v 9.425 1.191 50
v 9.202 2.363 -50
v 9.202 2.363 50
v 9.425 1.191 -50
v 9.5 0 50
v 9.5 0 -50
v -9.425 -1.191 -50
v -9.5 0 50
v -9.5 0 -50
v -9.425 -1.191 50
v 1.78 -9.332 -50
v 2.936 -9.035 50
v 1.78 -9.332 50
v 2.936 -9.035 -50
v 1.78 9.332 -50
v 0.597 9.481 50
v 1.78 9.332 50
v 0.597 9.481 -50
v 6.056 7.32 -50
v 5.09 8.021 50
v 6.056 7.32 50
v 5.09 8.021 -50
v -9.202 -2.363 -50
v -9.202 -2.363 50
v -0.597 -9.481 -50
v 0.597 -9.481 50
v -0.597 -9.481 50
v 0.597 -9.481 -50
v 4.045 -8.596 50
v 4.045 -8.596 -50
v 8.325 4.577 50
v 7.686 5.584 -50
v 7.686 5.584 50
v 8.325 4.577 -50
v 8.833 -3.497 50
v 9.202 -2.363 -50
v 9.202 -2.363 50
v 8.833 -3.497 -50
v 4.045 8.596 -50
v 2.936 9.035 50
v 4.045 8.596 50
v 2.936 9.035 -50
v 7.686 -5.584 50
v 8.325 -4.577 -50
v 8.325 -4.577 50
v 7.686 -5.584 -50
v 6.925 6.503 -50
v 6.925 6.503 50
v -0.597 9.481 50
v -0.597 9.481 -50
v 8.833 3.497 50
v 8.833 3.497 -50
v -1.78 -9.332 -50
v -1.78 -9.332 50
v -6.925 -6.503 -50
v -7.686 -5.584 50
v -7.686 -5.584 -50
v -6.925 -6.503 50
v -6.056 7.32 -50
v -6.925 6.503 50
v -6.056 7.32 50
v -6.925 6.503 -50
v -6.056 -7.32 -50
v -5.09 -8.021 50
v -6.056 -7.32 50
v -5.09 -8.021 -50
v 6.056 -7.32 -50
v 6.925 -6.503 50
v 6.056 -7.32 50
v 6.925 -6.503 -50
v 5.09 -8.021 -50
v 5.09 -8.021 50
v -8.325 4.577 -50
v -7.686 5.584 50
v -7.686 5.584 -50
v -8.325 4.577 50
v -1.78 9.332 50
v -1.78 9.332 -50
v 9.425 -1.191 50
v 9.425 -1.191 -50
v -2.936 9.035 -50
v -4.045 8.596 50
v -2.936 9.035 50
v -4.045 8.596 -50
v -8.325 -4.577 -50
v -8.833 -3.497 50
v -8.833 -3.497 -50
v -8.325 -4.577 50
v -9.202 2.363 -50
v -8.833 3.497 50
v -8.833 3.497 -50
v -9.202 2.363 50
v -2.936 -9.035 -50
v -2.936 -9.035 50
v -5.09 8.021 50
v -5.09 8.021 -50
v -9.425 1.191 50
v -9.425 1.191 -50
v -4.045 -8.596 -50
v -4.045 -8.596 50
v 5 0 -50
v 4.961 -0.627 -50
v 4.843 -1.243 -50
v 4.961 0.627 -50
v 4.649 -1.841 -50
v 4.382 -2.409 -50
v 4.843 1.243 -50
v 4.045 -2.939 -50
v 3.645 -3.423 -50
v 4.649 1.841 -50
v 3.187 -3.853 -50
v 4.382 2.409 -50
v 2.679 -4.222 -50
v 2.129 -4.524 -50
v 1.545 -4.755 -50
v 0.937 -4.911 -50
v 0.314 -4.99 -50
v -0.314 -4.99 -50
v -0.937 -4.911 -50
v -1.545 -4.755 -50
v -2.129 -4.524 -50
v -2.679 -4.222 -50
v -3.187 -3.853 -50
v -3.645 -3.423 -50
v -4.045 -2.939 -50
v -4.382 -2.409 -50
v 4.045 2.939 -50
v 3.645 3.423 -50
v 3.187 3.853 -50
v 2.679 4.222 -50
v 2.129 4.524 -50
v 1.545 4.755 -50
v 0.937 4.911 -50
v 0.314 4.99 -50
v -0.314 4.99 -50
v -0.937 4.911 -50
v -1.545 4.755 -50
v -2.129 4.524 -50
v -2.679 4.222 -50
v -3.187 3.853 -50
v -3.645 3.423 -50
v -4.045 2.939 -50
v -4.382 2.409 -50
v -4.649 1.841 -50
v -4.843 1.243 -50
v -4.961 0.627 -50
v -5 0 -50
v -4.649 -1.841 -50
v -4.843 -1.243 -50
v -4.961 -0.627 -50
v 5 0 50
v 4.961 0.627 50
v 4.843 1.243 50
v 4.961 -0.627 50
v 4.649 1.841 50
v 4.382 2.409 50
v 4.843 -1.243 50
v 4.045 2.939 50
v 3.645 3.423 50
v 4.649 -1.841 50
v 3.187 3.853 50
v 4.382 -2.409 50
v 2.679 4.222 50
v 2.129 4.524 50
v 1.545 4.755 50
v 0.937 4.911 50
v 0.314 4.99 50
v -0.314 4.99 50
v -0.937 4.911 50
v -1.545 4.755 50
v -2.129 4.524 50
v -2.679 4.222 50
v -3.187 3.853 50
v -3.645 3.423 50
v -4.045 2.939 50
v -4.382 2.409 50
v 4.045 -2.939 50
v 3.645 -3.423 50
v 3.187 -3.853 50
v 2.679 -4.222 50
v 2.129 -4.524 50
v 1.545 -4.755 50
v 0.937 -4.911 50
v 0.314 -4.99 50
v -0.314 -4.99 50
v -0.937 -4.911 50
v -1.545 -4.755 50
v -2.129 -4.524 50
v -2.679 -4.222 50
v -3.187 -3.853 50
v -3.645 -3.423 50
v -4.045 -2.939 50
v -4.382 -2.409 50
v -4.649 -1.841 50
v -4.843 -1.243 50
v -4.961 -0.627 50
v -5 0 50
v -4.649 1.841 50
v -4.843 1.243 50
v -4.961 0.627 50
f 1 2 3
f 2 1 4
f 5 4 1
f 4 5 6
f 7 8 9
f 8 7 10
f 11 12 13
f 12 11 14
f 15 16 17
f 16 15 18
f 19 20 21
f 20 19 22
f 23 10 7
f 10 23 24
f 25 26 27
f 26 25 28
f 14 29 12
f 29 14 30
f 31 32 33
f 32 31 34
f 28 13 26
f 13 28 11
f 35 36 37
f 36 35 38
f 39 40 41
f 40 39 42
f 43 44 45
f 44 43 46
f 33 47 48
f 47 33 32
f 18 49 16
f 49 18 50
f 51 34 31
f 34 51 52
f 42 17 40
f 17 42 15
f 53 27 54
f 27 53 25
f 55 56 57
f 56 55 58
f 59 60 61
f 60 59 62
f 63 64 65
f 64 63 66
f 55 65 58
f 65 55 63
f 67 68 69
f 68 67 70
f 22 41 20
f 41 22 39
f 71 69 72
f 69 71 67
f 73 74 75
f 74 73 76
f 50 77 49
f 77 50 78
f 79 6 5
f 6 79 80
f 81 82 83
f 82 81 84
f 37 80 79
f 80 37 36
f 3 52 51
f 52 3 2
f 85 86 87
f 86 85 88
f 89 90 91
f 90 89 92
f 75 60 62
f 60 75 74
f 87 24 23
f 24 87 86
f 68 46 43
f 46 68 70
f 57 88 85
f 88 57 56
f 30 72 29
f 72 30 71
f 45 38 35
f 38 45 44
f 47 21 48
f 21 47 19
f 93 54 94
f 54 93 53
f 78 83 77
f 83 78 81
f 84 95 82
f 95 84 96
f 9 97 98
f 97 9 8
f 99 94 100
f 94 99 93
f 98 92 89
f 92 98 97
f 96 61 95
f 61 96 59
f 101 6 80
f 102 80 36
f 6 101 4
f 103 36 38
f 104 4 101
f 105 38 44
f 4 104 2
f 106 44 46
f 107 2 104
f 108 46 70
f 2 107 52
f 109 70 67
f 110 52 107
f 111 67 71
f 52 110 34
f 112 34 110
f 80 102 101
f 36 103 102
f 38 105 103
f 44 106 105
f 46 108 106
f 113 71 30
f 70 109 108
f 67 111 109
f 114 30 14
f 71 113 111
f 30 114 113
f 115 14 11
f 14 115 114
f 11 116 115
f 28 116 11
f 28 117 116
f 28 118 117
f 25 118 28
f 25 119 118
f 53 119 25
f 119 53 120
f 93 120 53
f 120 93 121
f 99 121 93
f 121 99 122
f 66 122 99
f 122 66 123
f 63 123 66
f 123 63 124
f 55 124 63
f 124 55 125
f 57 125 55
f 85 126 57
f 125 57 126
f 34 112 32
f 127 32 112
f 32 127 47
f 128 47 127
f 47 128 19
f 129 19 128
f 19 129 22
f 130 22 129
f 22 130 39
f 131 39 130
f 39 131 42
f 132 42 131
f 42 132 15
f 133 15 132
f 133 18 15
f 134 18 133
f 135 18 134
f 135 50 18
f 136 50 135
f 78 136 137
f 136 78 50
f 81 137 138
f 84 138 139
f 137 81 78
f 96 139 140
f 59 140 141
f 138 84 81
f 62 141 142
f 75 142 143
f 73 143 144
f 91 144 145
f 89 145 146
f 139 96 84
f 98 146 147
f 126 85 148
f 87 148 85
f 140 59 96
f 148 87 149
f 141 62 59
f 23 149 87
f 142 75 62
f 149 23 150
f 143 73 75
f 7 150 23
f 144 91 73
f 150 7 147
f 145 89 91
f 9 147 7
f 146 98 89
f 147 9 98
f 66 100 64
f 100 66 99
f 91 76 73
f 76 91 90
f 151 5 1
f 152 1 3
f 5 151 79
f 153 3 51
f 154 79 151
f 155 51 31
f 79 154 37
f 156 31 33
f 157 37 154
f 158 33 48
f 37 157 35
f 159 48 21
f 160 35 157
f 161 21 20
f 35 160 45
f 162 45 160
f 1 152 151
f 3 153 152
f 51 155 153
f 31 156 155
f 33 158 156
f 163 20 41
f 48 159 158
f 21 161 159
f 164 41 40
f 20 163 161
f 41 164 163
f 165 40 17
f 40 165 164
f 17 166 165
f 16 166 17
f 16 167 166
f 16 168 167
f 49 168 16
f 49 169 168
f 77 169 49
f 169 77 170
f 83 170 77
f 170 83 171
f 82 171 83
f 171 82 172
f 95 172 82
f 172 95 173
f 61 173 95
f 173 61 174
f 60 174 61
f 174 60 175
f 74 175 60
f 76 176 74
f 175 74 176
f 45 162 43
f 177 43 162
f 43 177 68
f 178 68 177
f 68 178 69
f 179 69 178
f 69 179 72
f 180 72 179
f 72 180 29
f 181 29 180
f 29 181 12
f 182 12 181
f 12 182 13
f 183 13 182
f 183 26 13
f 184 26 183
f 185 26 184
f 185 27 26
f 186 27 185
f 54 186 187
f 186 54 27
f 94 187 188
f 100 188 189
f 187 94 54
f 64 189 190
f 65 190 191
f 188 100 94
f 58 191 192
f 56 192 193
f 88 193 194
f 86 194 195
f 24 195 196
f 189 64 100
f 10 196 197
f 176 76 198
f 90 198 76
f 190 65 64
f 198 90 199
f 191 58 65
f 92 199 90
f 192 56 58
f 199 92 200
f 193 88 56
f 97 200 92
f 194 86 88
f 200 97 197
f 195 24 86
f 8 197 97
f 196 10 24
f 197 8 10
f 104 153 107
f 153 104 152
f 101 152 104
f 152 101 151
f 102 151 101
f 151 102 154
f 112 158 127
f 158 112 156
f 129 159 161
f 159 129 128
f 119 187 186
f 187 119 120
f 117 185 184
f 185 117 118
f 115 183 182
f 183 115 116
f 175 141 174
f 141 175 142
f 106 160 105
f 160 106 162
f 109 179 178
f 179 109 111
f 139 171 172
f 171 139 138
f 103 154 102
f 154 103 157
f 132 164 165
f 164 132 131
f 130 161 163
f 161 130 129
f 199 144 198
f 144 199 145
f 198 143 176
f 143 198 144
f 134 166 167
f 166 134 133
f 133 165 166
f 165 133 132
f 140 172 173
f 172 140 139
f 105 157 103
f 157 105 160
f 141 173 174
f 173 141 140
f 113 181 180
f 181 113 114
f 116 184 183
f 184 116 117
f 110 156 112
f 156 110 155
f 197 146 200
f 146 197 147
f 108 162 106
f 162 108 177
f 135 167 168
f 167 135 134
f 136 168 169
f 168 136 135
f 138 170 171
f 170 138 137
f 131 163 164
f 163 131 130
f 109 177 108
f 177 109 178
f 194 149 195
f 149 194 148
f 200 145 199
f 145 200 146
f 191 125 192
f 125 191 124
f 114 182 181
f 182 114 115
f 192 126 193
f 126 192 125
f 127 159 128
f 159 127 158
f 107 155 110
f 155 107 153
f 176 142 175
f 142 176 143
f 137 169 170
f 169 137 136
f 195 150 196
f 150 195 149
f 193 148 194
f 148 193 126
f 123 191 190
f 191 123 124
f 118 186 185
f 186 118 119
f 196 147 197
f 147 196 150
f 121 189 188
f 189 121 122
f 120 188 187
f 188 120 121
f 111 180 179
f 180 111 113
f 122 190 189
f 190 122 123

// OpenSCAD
$fn = 50;


difference() {
	union() {
		translate(v = [0, 0, -50.0000000000]) {
			cylinder(h = 100, r = 9.5000000000);
		}
	}
	union() {
		translate(v = [0, 0, -100.0000000000]) {
			cylinder(h = 200, r = 5.0000000000);
		}
	}
}
